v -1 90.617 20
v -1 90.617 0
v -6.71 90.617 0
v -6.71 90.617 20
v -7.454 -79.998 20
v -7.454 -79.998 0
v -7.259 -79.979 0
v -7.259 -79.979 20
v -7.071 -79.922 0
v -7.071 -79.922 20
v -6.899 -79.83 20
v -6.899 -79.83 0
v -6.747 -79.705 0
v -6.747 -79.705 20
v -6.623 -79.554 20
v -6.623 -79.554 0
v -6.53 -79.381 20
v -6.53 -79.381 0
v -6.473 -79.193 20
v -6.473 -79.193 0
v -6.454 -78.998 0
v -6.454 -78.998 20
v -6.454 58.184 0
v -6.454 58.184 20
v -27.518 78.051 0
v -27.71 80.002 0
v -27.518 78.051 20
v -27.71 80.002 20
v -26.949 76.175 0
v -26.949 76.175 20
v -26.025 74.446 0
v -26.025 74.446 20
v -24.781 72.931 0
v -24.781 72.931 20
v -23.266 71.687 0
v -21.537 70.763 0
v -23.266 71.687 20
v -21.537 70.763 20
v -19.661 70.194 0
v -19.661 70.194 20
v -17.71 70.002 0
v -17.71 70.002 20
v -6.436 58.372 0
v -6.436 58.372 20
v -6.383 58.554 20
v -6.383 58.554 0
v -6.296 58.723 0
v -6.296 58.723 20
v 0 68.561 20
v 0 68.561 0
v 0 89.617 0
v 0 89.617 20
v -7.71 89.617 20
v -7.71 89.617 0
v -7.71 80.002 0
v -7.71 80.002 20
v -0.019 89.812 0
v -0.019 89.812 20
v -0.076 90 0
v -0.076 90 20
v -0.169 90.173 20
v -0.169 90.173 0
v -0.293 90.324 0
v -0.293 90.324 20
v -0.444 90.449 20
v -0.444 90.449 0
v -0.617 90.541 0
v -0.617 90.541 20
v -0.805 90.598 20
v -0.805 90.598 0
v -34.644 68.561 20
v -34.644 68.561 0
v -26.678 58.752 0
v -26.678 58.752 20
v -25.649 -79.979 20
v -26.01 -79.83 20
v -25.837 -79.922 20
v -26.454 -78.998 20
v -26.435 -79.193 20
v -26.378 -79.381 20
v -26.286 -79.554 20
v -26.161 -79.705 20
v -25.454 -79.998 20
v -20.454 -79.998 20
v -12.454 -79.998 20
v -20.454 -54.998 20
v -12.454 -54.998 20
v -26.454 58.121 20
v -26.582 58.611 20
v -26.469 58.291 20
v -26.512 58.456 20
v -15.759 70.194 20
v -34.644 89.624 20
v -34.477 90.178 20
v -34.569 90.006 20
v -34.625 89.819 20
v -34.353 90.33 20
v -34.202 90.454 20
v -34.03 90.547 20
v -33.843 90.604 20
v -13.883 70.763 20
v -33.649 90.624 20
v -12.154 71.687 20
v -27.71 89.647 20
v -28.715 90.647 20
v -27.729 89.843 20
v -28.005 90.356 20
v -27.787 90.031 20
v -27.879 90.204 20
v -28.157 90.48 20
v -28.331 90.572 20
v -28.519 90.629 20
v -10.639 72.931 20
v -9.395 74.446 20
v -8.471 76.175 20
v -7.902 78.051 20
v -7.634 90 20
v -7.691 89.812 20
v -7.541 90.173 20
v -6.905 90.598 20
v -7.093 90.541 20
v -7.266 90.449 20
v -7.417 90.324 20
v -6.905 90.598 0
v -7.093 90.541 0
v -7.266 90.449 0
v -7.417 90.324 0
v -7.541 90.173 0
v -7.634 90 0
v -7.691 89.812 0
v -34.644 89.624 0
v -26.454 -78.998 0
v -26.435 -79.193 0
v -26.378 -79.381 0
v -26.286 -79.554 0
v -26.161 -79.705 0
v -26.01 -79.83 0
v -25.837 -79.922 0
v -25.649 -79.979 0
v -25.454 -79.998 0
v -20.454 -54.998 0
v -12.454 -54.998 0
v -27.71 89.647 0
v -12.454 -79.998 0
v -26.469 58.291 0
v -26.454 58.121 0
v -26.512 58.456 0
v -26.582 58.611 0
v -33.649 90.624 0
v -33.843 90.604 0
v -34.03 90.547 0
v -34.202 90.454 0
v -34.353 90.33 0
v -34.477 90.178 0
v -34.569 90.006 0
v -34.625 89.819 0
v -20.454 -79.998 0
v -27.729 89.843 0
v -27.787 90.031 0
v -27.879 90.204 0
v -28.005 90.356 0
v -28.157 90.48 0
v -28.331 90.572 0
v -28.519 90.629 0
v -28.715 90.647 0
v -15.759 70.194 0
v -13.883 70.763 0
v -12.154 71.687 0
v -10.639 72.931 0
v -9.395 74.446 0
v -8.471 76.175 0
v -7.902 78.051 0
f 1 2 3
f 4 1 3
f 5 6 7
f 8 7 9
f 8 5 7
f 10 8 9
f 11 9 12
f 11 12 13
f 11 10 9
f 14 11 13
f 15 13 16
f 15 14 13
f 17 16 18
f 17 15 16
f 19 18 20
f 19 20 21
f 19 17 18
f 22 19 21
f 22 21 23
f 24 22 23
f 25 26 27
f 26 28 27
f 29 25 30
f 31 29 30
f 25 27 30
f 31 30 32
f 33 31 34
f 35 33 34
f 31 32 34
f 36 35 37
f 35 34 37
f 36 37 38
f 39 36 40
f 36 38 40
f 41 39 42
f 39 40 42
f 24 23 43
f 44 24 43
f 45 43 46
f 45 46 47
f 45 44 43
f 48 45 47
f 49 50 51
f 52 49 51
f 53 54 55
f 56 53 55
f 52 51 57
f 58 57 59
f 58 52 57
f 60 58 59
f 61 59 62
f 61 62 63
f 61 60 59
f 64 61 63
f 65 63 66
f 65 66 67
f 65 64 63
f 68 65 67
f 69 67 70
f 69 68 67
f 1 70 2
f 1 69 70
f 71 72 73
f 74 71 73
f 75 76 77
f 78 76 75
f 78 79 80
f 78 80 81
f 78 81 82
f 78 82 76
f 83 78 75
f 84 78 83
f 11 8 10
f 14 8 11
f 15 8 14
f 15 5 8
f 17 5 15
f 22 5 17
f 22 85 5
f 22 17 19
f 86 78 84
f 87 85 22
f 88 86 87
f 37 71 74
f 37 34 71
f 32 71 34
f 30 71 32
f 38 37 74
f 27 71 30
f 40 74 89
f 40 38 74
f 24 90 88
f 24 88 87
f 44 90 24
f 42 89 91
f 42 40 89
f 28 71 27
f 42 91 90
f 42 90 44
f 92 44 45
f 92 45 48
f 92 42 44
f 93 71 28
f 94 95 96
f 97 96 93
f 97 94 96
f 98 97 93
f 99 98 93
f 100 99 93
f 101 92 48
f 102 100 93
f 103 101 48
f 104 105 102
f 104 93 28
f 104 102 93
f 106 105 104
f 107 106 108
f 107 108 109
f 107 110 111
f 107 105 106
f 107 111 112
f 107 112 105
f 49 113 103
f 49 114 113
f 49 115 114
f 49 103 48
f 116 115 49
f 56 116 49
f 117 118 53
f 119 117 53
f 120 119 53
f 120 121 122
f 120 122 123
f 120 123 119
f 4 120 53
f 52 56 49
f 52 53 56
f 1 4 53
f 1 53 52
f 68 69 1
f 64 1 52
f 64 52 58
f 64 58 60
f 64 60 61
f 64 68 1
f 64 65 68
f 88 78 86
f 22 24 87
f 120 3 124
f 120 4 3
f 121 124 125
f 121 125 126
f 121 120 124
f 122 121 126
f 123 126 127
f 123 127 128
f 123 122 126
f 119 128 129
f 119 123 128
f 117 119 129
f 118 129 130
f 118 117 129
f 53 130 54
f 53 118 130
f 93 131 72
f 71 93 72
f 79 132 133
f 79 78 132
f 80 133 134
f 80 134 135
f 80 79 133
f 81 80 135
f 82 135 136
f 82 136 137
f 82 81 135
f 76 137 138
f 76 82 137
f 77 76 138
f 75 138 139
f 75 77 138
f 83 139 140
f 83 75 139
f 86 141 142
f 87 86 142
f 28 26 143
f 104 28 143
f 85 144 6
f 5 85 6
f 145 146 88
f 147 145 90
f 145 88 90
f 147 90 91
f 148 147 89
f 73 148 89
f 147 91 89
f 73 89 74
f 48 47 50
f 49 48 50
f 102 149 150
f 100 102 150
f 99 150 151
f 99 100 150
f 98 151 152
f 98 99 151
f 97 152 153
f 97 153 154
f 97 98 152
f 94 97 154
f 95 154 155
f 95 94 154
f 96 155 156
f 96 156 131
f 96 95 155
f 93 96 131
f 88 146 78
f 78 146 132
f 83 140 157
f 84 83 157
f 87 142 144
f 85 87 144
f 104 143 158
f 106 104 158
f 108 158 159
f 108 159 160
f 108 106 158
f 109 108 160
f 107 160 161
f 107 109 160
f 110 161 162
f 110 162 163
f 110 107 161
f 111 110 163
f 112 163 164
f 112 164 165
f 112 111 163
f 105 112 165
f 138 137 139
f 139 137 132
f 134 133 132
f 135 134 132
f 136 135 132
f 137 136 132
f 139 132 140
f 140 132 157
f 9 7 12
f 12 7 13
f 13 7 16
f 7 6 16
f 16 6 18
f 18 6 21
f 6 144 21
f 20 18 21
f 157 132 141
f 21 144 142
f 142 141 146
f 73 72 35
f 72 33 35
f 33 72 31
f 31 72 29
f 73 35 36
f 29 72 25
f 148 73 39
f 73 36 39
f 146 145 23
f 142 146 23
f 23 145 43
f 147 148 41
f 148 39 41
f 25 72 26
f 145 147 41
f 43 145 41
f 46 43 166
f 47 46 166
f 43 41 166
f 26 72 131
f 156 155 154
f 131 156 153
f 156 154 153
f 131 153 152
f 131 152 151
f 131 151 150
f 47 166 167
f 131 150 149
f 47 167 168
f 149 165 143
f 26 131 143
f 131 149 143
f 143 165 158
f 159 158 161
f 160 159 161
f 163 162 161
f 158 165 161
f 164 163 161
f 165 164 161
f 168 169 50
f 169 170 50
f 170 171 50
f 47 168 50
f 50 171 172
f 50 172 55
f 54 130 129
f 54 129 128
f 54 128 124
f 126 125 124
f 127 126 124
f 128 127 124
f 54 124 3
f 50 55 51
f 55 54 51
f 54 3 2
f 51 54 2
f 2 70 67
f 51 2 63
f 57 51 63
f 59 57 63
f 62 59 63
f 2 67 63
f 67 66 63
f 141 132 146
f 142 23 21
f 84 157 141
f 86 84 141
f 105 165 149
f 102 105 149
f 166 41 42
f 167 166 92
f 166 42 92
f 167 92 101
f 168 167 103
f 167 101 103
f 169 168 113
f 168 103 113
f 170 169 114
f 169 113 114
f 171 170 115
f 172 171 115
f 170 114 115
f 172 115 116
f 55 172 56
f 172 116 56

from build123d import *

# Parameters (mm, degrees)
F1_DEPTH = 20
F2_R     = 1
F3_R     = 9.99999


# Not quite as in the source:
# - two fillets or chamfers of one size are made in one step
# - a fillet or chamfer is up to 0.001 mm smaller than in the source, because OpenCascade refuses the exact size


with BuildPart() as f1:
    # F0 (on Top) → F1 (new body)
    with BuildSketch(Plane.XY):
        Polygon((-26.4541809829, 58.4762617946), (-26.4541809829, -79.9982637167), (-20.4541809829, -79.9982637167), (-20.4541809829, -54.9982637167), (-12.4541809829, -54.9982637167), (-12.4541809829, -79.9982637167), (-6.4541809829, -79.9982637167), (-6.4541809829, 58.4762617946), (0, 68.5610547662), (0, 90.617305144), (-7.710005641, 90.617305144), (-7.710005641, 70.0017362833), (-27.710005641, 70.0017362833), (-27.710005641, 90.6515493989), (-34.6441827714, 90.6196484681), (-34.6441827714, 68.5610547662), align=None)
    extrude(amount=F1_DEPTH)

    # F2
    f2_edges = [f1.edges().sort_by_distance(p)[0] for p in [
        (-26.454181, -79.998264, 10),
        (-6.454181, -79.998264, 10),
        (-27.710006, 90.651549, 10),
        (-34.644183, 90.619648, 10),
        (-26.454181, 58.476262, 10),
        (-6.454181, 58.476262, 10),
        (0, 90.617305, 10),
        (-7.710006, 90.617305, 10),
    ]]
    fillet(f2_edges, radius=F2_R)

    # F3 (radius 10 in the source; OpenCascade refuses exactly that, so slightly less here)
    f3_edges = [f1.edges().sort_by_distance(p)[0] for p in [
        (-7.710006, 70.001736, 10),
        (-27.710006, 70.001736, 10),
    ]]
    fillet(f3_edges, radius=F3_R)


solid = f1.part
